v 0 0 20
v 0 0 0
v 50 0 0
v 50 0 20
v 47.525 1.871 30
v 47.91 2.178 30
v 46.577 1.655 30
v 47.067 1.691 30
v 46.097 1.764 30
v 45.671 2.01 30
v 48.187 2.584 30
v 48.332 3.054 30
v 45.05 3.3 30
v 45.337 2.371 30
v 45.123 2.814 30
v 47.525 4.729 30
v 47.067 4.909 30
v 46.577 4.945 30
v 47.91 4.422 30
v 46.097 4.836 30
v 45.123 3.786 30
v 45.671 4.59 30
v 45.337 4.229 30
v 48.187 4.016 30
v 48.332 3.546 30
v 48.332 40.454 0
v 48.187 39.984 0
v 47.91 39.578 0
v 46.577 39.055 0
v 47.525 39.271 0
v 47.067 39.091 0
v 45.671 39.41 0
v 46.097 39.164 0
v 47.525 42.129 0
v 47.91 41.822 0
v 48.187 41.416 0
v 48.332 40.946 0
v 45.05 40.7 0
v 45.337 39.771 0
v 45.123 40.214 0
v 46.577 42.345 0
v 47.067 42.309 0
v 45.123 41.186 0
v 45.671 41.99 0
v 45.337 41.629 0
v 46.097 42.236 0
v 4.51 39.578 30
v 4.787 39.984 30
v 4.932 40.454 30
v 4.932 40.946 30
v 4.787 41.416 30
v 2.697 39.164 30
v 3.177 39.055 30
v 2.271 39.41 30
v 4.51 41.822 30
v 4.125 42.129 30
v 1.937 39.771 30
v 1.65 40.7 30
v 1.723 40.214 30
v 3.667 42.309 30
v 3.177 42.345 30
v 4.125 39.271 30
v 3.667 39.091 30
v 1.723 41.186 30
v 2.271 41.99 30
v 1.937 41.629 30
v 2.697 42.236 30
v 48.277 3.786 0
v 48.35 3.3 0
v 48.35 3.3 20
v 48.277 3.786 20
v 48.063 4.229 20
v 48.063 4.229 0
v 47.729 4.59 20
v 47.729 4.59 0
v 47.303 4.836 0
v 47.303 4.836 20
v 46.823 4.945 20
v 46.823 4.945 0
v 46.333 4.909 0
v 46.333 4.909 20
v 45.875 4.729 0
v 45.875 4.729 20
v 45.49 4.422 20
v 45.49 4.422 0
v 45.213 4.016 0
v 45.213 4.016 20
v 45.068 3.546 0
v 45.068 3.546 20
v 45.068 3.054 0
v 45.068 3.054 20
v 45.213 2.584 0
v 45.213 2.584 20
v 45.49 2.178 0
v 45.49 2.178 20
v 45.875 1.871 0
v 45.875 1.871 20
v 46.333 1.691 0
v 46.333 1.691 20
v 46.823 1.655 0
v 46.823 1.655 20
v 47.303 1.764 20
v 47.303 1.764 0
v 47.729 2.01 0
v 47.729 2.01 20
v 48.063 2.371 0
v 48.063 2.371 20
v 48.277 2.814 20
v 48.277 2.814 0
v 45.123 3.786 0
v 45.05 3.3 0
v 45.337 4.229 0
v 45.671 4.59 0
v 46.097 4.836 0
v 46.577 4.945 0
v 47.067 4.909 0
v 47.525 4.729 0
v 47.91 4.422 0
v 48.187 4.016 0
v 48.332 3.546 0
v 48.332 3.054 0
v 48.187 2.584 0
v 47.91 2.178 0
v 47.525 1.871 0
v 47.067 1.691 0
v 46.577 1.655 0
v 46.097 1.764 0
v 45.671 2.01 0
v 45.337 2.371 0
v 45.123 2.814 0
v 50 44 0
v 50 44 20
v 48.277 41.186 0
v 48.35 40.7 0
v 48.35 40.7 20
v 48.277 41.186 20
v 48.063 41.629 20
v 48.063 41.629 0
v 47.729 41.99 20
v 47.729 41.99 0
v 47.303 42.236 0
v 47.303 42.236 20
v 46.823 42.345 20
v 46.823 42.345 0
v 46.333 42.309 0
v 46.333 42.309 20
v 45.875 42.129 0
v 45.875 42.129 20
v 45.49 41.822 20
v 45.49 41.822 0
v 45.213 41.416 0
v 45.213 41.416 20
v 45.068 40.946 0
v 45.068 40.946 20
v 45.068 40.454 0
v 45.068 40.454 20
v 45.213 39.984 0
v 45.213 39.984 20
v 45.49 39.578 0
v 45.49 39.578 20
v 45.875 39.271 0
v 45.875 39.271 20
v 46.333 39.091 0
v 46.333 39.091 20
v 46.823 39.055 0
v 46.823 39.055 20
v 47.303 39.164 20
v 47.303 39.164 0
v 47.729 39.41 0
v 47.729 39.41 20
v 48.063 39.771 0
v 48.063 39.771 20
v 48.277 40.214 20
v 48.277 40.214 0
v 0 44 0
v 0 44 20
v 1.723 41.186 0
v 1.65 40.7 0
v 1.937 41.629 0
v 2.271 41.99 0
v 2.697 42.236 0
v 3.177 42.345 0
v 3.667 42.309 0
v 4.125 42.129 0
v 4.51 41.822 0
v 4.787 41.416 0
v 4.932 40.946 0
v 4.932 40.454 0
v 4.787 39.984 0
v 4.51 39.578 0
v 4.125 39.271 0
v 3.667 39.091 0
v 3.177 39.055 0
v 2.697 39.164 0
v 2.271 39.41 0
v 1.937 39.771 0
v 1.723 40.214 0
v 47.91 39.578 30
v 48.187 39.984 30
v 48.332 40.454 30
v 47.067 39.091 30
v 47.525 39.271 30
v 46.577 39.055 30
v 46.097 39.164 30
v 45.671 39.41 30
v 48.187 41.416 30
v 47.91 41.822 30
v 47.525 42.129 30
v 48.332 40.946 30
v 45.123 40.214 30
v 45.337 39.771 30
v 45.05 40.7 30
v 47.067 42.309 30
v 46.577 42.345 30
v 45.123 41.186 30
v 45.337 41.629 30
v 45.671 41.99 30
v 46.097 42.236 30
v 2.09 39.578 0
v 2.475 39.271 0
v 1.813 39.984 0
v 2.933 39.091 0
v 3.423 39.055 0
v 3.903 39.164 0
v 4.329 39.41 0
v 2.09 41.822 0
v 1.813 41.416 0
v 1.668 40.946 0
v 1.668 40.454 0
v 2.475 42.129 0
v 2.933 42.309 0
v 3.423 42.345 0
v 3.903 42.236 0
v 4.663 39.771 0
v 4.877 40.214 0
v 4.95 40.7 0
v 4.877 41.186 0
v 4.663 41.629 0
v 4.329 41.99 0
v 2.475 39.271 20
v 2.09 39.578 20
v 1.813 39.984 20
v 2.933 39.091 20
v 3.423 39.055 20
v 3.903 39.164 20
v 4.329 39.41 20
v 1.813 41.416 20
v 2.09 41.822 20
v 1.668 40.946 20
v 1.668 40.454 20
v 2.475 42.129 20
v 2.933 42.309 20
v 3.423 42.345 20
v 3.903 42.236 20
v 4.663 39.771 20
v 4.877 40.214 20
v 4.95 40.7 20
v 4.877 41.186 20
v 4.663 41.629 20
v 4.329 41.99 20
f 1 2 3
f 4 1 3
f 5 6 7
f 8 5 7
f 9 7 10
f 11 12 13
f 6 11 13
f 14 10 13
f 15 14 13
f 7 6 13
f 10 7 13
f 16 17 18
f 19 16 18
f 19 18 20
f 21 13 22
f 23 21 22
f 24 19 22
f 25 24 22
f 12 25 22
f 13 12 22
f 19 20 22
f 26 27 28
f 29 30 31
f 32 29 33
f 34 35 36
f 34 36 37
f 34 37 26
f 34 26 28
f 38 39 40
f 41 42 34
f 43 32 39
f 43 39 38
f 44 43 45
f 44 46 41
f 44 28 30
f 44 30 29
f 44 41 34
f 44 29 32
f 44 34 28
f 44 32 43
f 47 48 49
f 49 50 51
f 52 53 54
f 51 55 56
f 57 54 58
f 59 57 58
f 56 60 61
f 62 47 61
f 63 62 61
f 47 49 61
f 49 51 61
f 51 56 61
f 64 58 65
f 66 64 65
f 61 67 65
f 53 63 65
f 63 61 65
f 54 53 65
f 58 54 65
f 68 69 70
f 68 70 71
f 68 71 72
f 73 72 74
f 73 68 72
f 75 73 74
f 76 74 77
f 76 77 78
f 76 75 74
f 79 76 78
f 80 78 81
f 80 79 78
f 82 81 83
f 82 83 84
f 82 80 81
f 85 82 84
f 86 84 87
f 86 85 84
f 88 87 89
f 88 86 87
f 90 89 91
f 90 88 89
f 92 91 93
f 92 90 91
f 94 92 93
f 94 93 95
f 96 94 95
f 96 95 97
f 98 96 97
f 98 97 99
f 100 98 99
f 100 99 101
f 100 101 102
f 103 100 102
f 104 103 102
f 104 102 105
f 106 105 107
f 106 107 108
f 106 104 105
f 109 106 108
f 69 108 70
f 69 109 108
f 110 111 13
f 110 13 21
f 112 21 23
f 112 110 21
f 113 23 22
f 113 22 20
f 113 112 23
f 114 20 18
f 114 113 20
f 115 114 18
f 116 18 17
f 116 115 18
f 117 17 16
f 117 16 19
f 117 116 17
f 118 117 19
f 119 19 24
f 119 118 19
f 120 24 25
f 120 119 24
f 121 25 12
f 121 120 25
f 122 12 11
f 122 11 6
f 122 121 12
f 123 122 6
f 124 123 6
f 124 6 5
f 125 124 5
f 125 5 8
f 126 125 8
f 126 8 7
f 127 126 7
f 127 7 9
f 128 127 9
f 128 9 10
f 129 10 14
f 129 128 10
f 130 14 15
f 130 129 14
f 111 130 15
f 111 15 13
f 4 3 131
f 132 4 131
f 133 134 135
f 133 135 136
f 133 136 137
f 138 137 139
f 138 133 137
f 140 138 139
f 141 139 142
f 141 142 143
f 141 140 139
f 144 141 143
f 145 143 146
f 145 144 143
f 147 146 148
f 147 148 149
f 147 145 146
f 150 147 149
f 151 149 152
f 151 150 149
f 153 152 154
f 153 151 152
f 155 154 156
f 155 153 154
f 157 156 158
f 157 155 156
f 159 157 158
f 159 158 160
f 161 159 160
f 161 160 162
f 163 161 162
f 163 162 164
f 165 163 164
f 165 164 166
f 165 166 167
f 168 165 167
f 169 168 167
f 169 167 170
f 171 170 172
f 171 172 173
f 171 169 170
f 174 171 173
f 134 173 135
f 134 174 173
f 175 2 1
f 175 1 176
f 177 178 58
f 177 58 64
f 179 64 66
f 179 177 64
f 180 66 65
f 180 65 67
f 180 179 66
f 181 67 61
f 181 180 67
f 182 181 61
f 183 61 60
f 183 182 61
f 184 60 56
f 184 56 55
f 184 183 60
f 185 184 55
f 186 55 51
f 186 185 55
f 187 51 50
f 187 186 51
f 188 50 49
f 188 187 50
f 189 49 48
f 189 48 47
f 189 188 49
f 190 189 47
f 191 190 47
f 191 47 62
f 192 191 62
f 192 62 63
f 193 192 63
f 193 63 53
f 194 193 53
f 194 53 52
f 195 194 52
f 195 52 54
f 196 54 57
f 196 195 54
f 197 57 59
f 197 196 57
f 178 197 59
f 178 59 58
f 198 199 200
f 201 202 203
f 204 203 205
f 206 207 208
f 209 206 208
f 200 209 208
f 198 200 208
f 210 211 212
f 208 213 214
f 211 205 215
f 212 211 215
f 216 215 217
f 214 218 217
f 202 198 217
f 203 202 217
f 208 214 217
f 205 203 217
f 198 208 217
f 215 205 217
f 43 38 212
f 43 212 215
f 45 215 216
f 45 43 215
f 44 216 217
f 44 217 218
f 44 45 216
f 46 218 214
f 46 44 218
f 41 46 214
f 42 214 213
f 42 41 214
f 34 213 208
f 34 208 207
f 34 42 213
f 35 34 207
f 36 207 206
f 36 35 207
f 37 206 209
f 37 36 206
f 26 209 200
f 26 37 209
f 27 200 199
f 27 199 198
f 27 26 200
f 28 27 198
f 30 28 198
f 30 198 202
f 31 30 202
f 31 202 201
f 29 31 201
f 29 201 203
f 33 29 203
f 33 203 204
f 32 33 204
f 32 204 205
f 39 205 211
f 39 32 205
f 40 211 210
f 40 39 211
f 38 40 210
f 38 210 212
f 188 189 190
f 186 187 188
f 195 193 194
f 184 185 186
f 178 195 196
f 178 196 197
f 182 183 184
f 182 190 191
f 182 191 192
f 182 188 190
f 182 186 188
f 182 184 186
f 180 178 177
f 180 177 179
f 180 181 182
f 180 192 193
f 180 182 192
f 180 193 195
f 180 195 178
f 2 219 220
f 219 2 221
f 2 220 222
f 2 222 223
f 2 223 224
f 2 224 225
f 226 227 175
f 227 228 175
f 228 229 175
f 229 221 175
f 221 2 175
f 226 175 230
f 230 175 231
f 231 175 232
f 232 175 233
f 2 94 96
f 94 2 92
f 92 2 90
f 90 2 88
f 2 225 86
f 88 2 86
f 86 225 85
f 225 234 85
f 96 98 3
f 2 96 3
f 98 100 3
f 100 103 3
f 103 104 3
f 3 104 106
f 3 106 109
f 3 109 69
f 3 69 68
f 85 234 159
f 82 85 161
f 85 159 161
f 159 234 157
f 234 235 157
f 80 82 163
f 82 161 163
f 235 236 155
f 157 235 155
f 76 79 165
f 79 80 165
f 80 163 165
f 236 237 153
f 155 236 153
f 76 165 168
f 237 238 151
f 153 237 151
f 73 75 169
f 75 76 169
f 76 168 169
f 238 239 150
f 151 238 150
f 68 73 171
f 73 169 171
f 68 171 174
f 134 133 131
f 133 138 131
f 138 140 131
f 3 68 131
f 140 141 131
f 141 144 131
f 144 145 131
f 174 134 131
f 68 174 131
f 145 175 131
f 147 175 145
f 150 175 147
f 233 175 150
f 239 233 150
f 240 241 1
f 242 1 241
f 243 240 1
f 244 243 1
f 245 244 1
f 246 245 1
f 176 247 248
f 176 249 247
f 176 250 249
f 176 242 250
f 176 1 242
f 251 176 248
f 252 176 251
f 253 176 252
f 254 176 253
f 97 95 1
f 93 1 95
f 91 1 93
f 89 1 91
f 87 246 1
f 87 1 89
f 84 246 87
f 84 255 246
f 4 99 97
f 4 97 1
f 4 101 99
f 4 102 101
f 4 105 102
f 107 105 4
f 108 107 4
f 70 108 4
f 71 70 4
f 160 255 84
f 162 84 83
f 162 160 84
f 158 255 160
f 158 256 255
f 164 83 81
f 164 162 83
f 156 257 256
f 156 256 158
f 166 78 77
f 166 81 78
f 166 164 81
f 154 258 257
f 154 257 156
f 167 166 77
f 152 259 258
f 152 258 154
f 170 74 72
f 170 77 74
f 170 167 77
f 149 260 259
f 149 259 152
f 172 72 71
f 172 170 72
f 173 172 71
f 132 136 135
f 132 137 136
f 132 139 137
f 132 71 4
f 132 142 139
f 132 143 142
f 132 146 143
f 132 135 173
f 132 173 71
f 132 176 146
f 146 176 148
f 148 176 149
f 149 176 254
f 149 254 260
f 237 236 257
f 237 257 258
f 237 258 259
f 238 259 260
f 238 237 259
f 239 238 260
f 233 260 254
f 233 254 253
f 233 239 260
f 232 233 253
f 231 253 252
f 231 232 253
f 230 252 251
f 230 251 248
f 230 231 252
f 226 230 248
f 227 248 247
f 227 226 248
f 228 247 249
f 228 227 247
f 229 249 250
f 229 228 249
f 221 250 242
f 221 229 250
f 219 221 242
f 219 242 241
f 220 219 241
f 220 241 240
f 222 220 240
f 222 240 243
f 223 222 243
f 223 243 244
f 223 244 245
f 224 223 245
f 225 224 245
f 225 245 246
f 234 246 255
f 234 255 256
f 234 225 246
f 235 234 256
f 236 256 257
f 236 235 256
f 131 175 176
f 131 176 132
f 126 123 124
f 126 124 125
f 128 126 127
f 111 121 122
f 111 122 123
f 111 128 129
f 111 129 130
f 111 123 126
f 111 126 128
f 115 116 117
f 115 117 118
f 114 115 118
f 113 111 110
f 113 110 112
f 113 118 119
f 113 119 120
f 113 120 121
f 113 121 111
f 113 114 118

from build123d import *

# Parameters (mm, degrees)
SKETCH1_W             = 50
SKETCH1_H             = 44
SKETCH1_R             = 1.65
BOSS_EXTRUDE1_DEPTH   = 20
SKETCH3_R             = 1.65
BOSS_EXTRUDE2_DEPTH   = 30
BOSS_EXTRUDE2_2_DEPTH = 30
BOSS_EXTRUDE2_3_DEPTH = 30


with BuildPart() as part:
    # Sketch1 → Boss-Extrude1 (new body)
    with BuildSketch(Plane.XY):
        with Locations((25, 22)):
            Rectangle(SKETCH1_W, SKETCH1_H)
        with Locations((46.7, 40.7)):
            Circle(SKETCH1_R, mode=Mode.SUBTRACT)
        with Locations((3.3, 40.7)):
            Circle(SKETCH1_R, mode=Mode.SUBTRACT)
        with Locations((46.7, 3.3)):
            Circle(SKETCH1_R, mode=Mode.SUBTRACT)
    extrude(amount=BOSS_EXTRUDE1_DEPTH)


with BuildPart() as body_2:
    # Sketch3 → Boss-Extrude2 (new body)
    with BuildSketch(Plane(origin=(0, 0, 0), x_dir=(-1, 0, 0), z_dir=(0, 0, -1))):
        with Locations((-46.7, 40.7)):
            Circle(SKETCH3_R)
    extrude(amount=-BOSS_EXTRUDE2_DEPTH)


with BuildPart() as body_3:
    # Sketch3 → Boss-Extrude2 2 (new body)
    with BuildSketch(Plane(origin=(0, 0, 0), x_dir=(-1, 0, 0), z_dir=(0, 0, -1))):
        with Locations((-46.7, 3.3)):
            Circle(SKETCH3_R)
    extrude(amount=-BOSS_EXTRUDE2_2_DEPTH)


with BuildPart() as body_4:
    # Sketch3 → Boss-Extrude2 3 (new body)
    with BuildSketch(Plane(origin=(0, 0, 0), x_dir=(-1, 0, 0), z_dir=(0, 0, -1))):
        with Locations((-3.3, 40.7)):
            Circle(SKETCH3_R)
    extrude(amount=-BOSS_EXTRUDE2_3_DEPTH)


solid = Compound([part.part, body_2.part, body_3.part, body_4.part])
